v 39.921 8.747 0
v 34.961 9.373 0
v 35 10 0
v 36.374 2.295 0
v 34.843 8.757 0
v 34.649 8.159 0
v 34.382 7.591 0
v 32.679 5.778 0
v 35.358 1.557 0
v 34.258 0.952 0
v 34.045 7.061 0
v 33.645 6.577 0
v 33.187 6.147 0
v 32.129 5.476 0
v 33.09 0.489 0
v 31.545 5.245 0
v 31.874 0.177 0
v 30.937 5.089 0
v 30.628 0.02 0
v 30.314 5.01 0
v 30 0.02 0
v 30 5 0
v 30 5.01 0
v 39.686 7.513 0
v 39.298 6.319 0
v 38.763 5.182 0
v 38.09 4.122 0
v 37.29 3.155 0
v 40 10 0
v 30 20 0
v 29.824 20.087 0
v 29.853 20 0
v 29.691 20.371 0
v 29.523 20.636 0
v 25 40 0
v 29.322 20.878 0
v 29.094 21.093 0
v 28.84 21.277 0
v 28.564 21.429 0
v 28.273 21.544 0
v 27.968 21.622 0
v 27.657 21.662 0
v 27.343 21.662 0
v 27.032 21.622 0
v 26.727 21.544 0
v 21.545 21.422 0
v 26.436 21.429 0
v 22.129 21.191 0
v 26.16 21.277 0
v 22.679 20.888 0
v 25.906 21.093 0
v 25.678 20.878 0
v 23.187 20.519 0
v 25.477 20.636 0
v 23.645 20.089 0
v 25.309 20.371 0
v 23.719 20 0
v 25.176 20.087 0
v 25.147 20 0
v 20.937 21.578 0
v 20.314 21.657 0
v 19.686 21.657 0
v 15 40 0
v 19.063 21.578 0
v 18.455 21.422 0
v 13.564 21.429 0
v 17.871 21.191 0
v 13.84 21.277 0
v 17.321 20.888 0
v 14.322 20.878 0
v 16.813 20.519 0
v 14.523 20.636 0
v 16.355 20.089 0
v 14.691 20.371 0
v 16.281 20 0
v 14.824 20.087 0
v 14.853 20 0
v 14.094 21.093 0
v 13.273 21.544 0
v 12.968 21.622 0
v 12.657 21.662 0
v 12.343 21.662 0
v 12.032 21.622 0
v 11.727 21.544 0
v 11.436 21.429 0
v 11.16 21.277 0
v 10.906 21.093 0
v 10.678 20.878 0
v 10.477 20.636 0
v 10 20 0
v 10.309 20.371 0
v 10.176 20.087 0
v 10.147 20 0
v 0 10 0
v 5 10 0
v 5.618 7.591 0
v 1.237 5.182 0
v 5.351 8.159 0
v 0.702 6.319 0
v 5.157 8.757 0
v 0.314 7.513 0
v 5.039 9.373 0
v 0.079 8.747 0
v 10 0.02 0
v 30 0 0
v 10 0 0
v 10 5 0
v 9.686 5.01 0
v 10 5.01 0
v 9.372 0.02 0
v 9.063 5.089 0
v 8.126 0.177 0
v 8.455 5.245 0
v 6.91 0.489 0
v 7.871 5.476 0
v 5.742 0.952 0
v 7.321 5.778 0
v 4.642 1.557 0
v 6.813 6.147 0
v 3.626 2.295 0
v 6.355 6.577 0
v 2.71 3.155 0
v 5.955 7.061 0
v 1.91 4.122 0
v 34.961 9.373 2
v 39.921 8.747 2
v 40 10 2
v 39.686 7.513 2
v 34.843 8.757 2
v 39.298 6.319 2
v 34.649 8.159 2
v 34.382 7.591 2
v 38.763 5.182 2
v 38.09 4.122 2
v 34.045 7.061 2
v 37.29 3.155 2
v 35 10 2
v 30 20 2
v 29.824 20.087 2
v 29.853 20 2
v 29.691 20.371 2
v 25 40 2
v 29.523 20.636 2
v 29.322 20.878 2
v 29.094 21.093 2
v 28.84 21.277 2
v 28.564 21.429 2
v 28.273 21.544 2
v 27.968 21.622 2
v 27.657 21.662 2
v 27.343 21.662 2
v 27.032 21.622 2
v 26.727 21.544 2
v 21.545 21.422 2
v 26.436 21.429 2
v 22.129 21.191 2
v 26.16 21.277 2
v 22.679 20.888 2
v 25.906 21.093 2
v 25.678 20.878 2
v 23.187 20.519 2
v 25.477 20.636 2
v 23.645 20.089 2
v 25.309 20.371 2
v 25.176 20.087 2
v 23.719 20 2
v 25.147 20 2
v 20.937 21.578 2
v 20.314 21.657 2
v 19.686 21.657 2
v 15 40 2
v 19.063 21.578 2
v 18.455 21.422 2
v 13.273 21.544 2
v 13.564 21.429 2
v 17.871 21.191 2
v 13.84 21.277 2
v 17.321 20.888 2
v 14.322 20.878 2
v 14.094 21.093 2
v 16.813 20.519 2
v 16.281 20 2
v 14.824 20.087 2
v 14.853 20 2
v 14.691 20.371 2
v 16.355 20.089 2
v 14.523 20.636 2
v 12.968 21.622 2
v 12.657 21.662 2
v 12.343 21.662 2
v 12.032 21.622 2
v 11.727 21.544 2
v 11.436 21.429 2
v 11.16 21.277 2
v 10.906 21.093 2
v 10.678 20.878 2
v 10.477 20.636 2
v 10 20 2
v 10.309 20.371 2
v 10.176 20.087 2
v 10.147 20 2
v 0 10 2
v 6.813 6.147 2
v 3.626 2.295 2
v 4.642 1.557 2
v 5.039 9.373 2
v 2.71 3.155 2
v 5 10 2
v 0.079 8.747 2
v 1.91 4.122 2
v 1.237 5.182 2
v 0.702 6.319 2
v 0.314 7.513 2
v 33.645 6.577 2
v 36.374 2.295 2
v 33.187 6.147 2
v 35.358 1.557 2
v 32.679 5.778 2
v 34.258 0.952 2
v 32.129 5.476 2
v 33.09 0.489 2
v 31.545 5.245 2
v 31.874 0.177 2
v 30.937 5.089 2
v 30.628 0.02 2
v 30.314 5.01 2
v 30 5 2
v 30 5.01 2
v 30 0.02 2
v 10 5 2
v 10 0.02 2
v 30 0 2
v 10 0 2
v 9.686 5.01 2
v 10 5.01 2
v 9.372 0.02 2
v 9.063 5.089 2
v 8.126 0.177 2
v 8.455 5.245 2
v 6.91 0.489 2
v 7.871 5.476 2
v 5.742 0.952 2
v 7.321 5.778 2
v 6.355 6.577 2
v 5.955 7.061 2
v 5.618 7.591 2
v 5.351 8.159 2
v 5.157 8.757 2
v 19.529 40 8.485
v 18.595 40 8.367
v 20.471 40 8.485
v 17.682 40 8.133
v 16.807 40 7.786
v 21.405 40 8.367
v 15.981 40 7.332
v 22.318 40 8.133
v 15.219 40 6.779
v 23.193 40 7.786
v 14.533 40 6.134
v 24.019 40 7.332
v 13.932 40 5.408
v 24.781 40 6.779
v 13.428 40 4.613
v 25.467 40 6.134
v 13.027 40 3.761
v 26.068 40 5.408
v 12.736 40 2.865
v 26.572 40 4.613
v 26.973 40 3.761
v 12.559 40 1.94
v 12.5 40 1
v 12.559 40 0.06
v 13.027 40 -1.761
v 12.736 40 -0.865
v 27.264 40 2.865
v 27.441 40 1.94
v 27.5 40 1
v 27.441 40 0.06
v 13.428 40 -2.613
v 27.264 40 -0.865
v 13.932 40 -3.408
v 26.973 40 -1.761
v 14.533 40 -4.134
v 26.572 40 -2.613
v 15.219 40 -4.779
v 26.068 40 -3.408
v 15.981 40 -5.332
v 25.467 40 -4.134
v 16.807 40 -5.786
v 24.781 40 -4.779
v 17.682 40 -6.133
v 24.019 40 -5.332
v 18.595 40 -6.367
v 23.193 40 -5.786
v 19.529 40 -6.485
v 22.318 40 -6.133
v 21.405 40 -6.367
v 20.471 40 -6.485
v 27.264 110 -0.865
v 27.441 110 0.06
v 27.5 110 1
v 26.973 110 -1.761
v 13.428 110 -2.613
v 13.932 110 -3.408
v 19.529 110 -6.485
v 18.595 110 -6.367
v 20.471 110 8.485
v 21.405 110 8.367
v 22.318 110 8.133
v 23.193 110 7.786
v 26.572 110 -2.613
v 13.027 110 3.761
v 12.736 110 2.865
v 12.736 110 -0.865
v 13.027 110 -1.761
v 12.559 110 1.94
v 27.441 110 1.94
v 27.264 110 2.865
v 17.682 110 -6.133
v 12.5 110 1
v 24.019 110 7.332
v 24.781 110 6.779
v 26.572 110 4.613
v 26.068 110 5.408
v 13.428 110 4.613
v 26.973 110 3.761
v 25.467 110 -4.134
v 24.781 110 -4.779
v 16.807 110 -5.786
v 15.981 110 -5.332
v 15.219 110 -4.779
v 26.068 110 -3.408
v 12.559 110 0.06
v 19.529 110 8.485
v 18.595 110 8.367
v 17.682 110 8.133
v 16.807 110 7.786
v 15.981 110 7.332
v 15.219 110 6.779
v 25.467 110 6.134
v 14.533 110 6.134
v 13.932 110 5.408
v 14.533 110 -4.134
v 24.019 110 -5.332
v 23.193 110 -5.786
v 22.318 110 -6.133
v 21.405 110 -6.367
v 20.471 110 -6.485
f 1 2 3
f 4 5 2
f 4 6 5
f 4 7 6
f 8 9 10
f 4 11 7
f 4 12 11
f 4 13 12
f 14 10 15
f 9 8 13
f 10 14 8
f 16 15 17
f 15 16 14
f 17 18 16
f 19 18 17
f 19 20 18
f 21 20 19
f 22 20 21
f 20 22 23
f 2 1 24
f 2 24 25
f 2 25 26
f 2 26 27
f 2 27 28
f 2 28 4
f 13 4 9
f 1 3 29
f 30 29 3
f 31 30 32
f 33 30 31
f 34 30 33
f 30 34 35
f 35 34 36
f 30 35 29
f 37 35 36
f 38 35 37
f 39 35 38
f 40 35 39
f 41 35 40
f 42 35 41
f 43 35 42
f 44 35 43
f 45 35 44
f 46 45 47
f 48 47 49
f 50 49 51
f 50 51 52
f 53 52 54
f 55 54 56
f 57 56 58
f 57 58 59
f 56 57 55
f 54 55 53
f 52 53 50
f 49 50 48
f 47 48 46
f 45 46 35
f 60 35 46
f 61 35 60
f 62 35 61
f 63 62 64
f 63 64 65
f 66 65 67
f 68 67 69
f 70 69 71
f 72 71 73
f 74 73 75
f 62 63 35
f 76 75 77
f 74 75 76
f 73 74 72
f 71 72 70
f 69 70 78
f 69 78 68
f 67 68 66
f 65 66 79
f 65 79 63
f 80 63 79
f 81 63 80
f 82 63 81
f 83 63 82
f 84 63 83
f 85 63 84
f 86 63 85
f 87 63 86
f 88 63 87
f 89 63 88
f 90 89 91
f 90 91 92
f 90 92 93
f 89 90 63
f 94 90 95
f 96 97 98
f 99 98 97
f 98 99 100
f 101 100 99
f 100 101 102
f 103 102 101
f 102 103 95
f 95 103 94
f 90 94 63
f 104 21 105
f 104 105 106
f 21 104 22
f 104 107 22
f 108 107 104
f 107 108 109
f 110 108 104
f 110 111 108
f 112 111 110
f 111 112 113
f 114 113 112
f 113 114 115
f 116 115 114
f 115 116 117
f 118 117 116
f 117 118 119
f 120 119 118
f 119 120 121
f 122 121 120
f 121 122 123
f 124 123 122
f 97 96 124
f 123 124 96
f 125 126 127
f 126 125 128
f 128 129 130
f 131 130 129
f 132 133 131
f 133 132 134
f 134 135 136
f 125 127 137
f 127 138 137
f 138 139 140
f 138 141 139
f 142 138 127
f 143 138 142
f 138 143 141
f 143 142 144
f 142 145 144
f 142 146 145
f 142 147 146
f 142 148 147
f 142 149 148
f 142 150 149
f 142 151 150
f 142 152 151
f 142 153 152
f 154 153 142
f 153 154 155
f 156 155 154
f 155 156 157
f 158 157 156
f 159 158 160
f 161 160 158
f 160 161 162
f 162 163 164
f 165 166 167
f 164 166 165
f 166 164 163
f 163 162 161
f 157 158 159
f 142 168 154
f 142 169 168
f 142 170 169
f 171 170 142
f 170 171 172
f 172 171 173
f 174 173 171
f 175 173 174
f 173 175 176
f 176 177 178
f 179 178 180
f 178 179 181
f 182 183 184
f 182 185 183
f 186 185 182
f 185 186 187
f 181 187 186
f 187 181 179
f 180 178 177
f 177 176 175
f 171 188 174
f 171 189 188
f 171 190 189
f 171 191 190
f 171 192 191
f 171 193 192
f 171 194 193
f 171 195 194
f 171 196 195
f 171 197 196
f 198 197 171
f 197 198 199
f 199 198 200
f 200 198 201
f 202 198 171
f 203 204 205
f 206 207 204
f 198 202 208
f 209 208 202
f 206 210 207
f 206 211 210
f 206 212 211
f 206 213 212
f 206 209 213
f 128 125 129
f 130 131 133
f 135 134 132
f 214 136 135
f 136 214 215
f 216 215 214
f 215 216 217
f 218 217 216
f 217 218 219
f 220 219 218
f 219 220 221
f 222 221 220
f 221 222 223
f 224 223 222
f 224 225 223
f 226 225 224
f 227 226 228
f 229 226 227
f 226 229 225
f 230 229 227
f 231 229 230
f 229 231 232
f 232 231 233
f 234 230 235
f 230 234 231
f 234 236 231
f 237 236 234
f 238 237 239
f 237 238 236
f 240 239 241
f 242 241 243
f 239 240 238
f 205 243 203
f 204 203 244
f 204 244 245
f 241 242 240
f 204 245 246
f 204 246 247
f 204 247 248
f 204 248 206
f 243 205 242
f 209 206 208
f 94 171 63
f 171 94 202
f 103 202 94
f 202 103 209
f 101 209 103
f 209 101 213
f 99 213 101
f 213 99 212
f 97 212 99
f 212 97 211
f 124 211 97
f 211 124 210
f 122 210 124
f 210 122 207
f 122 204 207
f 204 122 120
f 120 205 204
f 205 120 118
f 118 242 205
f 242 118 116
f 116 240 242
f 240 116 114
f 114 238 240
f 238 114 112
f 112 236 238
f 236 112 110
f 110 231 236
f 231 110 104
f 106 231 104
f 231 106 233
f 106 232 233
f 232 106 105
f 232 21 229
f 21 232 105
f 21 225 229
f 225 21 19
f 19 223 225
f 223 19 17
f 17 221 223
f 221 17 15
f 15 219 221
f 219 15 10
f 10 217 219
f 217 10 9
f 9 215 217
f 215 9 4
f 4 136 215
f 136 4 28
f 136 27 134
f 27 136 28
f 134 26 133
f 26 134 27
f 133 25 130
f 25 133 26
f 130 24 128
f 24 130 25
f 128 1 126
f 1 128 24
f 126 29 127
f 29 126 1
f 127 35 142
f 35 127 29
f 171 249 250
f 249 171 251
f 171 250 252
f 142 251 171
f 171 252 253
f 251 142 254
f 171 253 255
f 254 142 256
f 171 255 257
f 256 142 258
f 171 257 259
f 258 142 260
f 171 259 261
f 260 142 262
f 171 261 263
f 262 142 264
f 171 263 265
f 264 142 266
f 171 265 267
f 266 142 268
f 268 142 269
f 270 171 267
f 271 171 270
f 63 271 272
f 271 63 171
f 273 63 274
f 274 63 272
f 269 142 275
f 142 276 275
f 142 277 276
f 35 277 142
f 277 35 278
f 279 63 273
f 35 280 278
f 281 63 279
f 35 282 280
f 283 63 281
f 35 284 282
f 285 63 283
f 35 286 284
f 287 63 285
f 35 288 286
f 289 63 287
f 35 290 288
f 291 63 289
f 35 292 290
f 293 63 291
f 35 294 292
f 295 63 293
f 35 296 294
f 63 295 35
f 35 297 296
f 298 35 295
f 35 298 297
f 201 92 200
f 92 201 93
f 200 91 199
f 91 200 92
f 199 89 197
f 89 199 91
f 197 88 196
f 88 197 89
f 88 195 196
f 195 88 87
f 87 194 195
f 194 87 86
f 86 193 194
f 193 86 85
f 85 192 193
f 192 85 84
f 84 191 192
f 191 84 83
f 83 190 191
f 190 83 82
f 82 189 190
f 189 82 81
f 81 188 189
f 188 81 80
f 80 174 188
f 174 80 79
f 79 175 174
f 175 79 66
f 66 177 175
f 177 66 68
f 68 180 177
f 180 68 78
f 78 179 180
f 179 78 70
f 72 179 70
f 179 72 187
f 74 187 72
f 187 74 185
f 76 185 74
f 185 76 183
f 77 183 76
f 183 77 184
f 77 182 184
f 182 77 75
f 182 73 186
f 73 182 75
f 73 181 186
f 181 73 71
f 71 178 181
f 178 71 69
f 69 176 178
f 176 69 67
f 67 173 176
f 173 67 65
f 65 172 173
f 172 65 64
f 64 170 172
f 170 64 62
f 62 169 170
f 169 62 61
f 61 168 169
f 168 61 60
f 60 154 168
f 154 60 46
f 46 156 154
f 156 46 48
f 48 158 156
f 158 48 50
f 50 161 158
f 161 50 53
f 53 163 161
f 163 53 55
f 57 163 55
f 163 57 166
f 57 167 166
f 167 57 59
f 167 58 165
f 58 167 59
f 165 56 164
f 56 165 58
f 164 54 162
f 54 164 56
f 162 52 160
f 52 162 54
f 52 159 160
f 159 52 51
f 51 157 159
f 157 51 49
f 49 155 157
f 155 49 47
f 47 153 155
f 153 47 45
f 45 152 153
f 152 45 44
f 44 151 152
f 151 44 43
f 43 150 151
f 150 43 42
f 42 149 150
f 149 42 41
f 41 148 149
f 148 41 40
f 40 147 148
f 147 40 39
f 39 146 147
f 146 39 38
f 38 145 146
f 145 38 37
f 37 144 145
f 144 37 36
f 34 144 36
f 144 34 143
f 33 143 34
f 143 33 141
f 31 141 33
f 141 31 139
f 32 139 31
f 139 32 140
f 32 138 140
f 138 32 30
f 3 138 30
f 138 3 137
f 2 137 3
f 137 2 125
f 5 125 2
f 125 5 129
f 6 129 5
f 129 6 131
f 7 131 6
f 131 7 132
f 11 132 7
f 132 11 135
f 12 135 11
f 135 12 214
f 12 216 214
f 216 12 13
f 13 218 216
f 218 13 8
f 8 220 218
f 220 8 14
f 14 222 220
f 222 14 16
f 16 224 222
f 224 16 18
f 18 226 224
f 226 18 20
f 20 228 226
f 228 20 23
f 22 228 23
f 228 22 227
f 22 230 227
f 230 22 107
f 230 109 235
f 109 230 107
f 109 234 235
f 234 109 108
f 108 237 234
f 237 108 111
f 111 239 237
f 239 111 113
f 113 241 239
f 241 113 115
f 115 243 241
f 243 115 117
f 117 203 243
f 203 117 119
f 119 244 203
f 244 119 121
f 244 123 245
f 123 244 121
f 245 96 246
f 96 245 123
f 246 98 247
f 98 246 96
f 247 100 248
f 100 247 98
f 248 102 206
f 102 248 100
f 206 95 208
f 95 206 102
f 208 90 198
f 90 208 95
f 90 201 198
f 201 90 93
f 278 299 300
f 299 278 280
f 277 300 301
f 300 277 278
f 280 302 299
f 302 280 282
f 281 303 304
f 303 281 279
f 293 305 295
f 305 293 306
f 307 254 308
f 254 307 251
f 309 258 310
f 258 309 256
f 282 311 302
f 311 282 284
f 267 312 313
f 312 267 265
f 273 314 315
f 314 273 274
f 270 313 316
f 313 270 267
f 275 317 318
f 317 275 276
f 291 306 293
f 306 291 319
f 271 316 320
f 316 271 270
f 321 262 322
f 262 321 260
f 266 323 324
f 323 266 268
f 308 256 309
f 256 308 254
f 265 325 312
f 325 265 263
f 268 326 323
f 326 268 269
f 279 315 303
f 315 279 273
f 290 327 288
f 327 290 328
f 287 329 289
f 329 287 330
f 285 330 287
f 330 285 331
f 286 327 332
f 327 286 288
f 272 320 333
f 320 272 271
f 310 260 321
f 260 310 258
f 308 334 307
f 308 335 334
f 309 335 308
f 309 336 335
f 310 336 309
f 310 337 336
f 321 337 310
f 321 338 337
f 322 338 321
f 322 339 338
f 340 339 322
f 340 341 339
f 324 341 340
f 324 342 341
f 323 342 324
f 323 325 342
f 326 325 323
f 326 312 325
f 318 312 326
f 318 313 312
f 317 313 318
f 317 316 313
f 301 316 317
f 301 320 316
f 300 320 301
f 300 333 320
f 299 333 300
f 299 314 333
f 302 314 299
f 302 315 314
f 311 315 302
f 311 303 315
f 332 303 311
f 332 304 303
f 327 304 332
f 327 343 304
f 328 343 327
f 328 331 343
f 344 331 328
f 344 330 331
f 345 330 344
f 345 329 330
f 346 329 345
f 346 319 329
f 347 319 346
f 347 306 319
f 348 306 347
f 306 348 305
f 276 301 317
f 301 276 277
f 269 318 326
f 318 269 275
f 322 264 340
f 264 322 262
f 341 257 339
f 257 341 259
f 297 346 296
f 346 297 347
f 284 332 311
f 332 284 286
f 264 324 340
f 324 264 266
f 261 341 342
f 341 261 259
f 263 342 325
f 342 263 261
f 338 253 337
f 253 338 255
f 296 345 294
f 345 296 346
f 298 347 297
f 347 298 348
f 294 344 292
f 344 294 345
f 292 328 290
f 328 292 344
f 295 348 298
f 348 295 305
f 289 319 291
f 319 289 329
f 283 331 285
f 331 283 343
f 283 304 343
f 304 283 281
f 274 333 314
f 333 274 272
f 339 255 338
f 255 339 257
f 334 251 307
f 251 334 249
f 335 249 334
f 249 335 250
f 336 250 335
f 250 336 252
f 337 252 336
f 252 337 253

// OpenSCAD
// Set the total width of the bottle opener
width = 40; //[30:50]
// Set the height of the opening
openingHeight = 15; //[5:30]
// Set the width of the openers frame
frameWidth = 5; //[3:10]
// Set the thickness of the frame of the opener
thickness = 2; //[2:10]
// Set the height of the neck of the opener
neckHeight = 20; //[15:30]
// Set the width of the neck of the opener
neckWidth = 10; //[5:15]
// Set the radius of the small cavity
smallPinCircle = 2.5; // 
// Set the height of the small cavity
smallPinLoc = 3; // 
// Set the radius of the big cavity
bigPinCircle = 5; //
// Set the height of the big cavity
bigPinLoc = 1.5; // 
// Set the radius of the grip
gripWidth = 7.5; // [5:15]
// Set the length of the grip
gripLength = 70; // [40:150]

/* [hidden] */

$fn = 50;

union()
{
	linear_extrude(height = thickness)
	union()
	{
		intersection()
		{
			difference()
			{
				translate([frameWidth*2,frameWidth*2,0])circle(frameWidth*2);
				translate([frameWidth*2,frameWidth*2,0])circle(frameWidth);
			}
			polygon(points = [ [0,0], [0, frameWidth*2], [frameWidth*2,frameWidth*2], [frameWidth*2,frameWidth], [frameWidth*2,0] ], paths = [[0,1,2,3,4]] );
		}
		polygon(points = [ [0,frameWidth*2], [frameWidth,frameWidth*2], [frameWidth*2,openingHeight+(frameWidth)], [frameWidth,openingHeight+(frameWidth)] ], paths = [[0,1,2,3]] );
		polygon(points = [ [frameWidth*2,0], [width-(frameWidth*2),0], [width-(frameWidth*2),frameWidth], [frameWidth*2,frameWidth] ], paths = [[0,1,2,3]] );
		intersection()
		{
			difference()
			{
				translate([width-frameWidth*2,frameWidth*2,0])circle(frameWidth*2);
				translate([width-frameWidth*2,frameWidth*2,0])circle(frameWidth);
			}
			polygon(points = [ [width,0], [width, frameWidth*2], [width-frameWidth*2,frameWidth*2], [width-frameWidth*2,frameWidth], [width-frameWidth*2,0] ], paths = [[0,1,2,3,4]] );
		}
		polygon(points = [ [width,frameWidth*2], [width-frameWidth,frameWidth*2], [width-frameWidth*2,openingHeight+(frameWidth)], [width-frameWidth,openingHeight+(frameWidth)] ], paths = [[0,1,2,3]] );
		difference()
		{
			polygon(points = [ [frameWidth,openingHeight+frameWidth], [width-frameWidth,openingHeight+frameWidth], [width/2+neckWidth/2,openingHeight+frameWidth+neckHeight], [width/2-neckWidth/2,openingHeight+frameWidth+neckHeight] ], paths = [[0,1,2,3]] );
			intersection()
			{
				translate([frameWidth*2+smallPinCircle,openingHeight+frameWidth-smallPinCircle/3,0])circle(smallPinCircle);
				polygon(points = [ [frameWidth,openingHeight+frameWidth], [width-frameWidth,openingHeight+frameWidth], [width/2+neckWidth/2,openingHeight+frameWidth+neckHeight], [width/2-neckWidth/2,openingHeight+frameWidth+neckHeight] ], paths = [[0,1,2,3]] );
			}
			intersection()
			{
				translate([width-frameWidth*2-smallPinCircle,openingHeight+frameWidth-smallPinCircle/smallPinLoc,0])circle(smallPinCircle);
				polygon(points = [ [frameWidth,openingHeight+frameWidth], [width-frameWidth,openingHeight+frameWidth], [width/2+neckWidth/2,openingHeight+frameWidth+neckHeight], [width/2-neckWidth/2,openingHeight+frameWidth+neckHeight] ], paths = [[0,1,2,3]] );
			}
			intersection()
			{
				translate([width/2,openingHeight+frameWidth-bigPinCircle/bigPinLoc,0])circle(bigPinCircle);
				polygon(points = [ [frameWidth,openingHeight+frameWidth], [width-frameWidth,openingHeight+frameWidth], [width/2+neckWidth/2,openingHeight+frameWidth+neckHeight], [width/2-neckWidth/2,openingHeight+frameWidth+neckHeight] ], paths = [[0,1,2,3]] );
			}
		}
	}
	translate([width/2,openingHeight+frameWidth+neckHeight,thickness/2])rotate(a=-90, v=[1,0,0])cylinder(h = gripLength, r = gripWidth);
}
